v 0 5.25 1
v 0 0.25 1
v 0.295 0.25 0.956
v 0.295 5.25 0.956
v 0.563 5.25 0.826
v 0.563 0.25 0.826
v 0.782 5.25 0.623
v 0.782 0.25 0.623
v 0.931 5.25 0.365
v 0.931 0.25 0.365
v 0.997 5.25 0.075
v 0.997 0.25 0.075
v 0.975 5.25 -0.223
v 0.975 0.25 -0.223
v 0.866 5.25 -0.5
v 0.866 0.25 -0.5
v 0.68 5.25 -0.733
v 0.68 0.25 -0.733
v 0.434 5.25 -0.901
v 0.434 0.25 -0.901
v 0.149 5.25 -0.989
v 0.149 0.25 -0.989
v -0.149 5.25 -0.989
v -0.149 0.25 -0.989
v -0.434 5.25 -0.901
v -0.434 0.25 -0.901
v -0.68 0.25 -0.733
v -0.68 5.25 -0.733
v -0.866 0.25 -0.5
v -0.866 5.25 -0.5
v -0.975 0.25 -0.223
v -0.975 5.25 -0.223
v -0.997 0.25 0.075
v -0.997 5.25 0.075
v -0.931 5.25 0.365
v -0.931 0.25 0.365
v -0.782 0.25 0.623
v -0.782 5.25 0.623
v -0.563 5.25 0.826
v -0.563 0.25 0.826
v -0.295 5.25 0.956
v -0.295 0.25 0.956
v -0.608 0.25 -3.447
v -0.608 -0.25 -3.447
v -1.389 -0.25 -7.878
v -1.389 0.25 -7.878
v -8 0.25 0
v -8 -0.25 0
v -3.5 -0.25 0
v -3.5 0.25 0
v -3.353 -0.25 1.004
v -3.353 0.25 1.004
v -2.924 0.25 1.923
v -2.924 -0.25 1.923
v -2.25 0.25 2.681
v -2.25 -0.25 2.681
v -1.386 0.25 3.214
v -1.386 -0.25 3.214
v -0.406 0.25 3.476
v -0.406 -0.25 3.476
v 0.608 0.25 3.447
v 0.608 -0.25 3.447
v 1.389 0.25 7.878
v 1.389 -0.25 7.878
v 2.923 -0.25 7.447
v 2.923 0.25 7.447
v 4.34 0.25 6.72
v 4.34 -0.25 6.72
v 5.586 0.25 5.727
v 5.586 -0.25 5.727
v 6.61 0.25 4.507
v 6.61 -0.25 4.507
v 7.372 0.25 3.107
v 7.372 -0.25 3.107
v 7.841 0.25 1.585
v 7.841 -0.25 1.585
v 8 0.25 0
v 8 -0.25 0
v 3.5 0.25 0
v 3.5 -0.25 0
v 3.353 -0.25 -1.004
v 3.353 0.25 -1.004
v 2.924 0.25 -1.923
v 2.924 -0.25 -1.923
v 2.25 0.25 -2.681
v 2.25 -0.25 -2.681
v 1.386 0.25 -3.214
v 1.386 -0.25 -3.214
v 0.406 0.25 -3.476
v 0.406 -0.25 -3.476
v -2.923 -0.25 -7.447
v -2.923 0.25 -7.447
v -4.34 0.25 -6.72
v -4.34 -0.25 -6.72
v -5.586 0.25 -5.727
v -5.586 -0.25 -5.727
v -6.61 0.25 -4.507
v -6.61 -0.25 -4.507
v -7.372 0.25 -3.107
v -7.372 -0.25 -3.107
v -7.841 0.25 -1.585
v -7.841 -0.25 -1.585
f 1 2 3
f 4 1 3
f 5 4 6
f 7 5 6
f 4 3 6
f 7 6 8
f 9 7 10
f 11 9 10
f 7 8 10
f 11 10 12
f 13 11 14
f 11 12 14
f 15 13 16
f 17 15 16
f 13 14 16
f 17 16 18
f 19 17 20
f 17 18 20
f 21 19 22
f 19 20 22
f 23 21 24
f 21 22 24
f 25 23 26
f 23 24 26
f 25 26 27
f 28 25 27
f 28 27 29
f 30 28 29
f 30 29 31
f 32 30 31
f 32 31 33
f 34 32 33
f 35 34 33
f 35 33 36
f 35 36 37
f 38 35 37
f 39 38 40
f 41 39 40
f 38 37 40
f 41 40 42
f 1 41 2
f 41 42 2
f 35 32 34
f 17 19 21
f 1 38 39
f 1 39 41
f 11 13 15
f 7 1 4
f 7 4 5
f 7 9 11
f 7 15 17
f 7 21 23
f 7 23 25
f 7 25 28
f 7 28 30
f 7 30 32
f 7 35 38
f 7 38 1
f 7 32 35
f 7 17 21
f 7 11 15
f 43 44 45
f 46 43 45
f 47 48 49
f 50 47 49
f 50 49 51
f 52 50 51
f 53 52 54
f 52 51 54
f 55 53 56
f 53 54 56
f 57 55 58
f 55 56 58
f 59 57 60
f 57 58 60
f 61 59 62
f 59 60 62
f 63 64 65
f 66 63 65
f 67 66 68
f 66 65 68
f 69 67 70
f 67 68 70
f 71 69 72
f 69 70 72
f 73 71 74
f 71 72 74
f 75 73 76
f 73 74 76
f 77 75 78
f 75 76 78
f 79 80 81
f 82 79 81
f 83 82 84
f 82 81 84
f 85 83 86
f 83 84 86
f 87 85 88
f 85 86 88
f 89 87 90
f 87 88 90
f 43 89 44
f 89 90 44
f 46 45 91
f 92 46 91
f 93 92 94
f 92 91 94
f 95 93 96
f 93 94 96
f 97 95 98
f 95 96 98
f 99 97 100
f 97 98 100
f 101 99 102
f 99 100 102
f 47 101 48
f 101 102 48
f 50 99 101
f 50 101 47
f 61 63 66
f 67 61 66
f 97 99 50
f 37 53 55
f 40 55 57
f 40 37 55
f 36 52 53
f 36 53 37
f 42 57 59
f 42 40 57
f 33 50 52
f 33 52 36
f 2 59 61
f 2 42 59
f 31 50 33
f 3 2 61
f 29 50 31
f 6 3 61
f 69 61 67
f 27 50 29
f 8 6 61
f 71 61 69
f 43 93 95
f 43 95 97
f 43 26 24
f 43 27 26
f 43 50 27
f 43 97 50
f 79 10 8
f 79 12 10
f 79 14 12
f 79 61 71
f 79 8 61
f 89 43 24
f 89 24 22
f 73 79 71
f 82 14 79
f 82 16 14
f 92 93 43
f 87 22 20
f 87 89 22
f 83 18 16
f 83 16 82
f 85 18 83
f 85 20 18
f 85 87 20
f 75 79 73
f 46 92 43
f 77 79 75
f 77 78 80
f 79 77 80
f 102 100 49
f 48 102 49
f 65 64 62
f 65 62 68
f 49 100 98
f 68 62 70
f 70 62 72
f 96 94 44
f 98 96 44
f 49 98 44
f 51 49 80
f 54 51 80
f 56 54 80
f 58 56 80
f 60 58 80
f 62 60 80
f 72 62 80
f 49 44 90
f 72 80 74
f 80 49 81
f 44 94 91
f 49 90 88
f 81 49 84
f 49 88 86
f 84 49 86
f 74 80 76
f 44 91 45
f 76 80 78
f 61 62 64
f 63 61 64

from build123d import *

# Parameters (mm, degrees)
SALIENTE_EXTRUIR1_DEPTH      = 0.25
SALIENTE_EXTRUIR1_DEPTH_BACK = 0.25
CROQUIS2_R                   = 1
SALIENTE_EXTRUIR2_DEPTH      = 5


with BuildPart() as part:
    # Croquis1 → Saliente-Extruir1 (new, two sides: drawn at the far end of the back side and taken through both)
    with BuildSketch(Plane(origin=(0, 0, 0), x_dir=(1, 0, 0), z_dir=(0, 1, 0)).offset(-SALIENTE_EXTRUIR1_DEPTH_BACK)):
        with BuildLine():
            Line((8, 0), (3.5, 0))
            ThreePointArc((3.5, 0), (2.249756634, 2.681155551), (-0.607768622, 3.446827136))
            Line((-0.607768622, 3.446827136), (-1.389185421, 7.878462024))
            ThreePointArc((-1.389185421, 7.878462024), (-6.128355545, 5.142300877), (-8, 0))
            Line((-8, 0), (-3.5, 0))
            ThreePointArc((-3.5, 0), (-2.249756634, -2.681155551), (0.607768622, -3.446827136))
            Line((0.607768622, -3.446827136), (1.389185421, -7.878462024))
            ThreePointArc((1.389185421, -7.878462024), (6.128355545, -5.142300877), (8, 0))
        make_face()
    extrude(amount=SALIENTE_EXTRUIR1_DEPTH + SALIENTE_EXTRUIR1_DEPTH_BACK)

    # Croquis2 → Saliente-Extruir2 (add)
    with BuildSketch(Plane(origin=(0, 0.25, 0), x_dir=(1, 0, 0), z_dir=(0, 1, 0))):
        Circle(CROQUIS2_R)
    extrude(amount=SALIENTE_EXTRUIR2_DEPTH)


solid = part.part
